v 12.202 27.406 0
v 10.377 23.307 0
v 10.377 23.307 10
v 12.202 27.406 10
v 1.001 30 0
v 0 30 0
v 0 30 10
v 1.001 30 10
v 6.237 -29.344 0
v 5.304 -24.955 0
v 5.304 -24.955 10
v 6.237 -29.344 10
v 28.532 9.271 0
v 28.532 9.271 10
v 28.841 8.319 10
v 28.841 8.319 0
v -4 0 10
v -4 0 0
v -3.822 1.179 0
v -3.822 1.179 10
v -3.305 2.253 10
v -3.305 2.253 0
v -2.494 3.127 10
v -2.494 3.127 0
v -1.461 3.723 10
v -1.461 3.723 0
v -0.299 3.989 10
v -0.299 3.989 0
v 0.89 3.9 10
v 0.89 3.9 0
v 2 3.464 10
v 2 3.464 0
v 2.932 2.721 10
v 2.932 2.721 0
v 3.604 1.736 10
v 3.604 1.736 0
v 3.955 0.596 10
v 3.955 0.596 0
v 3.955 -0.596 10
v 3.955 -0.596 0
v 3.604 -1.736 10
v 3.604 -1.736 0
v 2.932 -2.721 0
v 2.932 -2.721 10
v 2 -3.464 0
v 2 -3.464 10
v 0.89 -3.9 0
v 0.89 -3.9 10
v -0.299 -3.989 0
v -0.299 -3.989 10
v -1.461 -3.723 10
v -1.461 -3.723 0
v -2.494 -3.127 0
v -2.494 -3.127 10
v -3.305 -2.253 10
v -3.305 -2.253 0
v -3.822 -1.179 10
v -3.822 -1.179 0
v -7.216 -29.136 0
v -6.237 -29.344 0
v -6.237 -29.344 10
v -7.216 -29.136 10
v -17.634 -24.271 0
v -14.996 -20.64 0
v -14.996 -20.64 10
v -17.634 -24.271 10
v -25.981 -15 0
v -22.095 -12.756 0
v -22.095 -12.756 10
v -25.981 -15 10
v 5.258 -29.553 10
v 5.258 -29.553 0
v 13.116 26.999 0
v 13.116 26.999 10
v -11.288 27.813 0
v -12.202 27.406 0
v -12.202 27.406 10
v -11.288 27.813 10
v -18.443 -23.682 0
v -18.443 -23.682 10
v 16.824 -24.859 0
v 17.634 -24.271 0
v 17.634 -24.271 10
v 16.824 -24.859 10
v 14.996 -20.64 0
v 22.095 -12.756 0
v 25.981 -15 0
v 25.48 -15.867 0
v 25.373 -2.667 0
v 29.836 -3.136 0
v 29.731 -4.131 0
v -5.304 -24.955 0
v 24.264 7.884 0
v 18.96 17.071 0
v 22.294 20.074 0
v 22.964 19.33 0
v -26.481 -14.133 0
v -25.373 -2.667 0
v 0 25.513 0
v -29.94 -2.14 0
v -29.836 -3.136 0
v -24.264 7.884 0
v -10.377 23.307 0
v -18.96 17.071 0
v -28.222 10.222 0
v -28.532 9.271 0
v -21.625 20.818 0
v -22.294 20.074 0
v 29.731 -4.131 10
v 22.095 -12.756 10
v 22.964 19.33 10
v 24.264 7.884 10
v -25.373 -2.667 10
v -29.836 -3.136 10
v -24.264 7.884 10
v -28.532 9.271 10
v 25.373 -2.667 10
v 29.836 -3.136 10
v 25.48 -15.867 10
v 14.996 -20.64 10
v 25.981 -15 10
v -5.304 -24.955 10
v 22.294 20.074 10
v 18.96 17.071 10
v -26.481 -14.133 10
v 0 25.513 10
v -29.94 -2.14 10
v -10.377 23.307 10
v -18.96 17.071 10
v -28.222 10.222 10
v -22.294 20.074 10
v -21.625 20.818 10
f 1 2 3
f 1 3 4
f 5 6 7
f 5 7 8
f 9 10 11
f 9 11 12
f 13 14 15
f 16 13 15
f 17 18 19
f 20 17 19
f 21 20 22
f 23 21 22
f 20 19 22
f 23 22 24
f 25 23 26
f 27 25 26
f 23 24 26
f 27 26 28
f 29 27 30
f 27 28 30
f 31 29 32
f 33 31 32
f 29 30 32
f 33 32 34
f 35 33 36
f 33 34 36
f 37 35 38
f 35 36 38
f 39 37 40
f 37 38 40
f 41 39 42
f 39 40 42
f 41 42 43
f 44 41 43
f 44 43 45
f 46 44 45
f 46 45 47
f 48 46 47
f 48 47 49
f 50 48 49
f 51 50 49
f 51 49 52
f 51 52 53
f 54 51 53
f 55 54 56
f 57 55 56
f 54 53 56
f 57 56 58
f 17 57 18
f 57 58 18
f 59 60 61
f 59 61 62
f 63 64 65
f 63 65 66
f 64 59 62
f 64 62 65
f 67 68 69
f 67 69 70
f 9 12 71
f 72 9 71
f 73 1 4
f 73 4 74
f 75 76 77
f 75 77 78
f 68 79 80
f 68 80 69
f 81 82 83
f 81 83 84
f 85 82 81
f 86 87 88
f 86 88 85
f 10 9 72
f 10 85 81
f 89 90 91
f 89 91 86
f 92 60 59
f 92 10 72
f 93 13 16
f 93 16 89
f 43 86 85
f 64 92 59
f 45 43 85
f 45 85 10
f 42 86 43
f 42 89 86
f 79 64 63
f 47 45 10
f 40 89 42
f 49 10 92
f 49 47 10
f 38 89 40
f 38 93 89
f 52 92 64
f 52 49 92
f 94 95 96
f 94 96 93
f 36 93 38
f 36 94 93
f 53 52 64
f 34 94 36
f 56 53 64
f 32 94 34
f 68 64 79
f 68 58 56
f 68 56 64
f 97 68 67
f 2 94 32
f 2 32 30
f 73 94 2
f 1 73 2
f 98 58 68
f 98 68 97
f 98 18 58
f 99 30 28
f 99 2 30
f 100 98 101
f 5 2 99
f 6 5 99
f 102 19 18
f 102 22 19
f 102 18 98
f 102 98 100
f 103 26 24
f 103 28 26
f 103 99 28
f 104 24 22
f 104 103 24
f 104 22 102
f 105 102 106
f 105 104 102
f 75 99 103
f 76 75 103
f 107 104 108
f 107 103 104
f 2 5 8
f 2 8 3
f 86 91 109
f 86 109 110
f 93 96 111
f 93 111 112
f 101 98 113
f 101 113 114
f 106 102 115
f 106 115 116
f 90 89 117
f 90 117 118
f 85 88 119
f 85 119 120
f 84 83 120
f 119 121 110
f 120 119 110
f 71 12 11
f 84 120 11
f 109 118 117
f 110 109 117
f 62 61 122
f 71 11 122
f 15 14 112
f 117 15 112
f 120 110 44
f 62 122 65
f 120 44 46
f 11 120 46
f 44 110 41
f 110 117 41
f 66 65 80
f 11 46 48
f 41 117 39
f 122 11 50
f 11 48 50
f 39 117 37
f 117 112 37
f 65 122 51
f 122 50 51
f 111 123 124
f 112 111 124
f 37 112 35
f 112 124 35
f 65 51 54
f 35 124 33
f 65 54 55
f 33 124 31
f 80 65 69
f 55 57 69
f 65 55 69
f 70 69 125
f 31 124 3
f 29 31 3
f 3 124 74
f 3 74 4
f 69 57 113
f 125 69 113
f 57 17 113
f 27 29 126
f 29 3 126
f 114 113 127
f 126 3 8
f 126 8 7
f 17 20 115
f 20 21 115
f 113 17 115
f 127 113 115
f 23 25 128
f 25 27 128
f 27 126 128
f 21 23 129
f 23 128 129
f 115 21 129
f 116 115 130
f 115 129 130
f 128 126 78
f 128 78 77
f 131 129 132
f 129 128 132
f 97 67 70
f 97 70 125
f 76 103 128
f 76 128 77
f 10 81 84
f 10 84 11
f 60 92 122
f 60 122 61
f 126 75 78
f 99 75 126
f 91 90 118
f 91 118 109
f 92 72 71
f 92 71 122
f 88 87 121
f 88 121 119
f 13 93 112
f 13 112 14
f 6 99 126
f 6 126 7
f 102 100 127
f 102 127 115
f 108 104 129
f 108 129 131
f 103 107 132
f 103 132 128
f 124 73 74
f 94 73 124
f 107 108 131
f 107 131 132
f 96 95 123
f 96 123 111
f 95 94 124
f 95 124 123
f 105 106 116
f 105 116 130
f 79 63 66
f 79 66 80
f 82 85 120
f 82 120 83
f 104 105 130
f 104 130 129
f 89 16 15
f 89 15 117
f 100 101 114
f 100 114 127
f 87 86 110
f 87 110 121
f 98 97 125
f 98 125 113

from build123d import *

# Parameters (mm, degrees)
BOSS_EXTRUDE2_DEPTH = 10
SKETCH2_R           = 4
CUT_EXTRUDE1_DEPTH  = 10


with BuildPart() as part:
    # Sketch1 → Boss-Extrude2 (new body)
    with BuildSketch(Plane.XY):
        Polygon((0, 25.51264103), (0, 30), (1.000891574, 30), (10.376925968, 23.306957325), (12.202099292, 27.406363729), (13.116459243, 26.99926445), (18.959587166, 17.071288962), (22.294344764, 20.073918191), (22.96407195, 19.330110797), (24.263963499, 7.88383965), (28.531695489, 9.270509831), (28.840987995, 8.318605378), (25.372880113, -2.666797161), (29.835656861, -3.135853898), (29.731035203, -4.131262483), (22.094595249, -12.756320515), (25.980762114, -15), (25.480316326, -15.86679753), (14.995954144, -20.640160164), (17.633557569, -24.270509831), (16.823819276, -24.858819138), (5.304376334, -24.955128612), (6.237350725, -29.344428022), (5.258331033, -29.552525082), (-5.304376334, -24.955128612), (-6.237350725, -29.344428022), (-7.216370416, -29.136330963), (-14.995954144, -20.640160164), (-17.633557569, -24.270509831), (-18.443295862, -23.682200525), (-22.094595249, -12.756320515), (-25.980762114, -15), (-26.481207901, -14.13320247), (-25.372880113, -2.666797161), (-29.835656861, -3.135853898), (-29.940278519, -2.140445313), (-24.263963499, 7.88383965), (-28.531695489, 9.270509831), (-28.222402983, 10.222414285), (-18.959587165, 17.071288962), (-22.294344764, 20.073918191), (-21.624617578, 20.817725585), (-10.376925968, 23.306957325), (-12.202099292, 27.406363729), (-11.287739341, 27.813463008), align=None)
    extrude(amount=BOSS_EXTRUDE2_DEPTH)

    # Sketch2 → Cut-Extrude1 (cut)
    with BuildSketch(Plane(origin=(0, 0, 0), x_dir=(-1, 0, 0), z_dir=(0, 0, -1))):
        Circle(SKETCH2_R)
    extrude(amount=-CUT_EXTRUDE1_DEPTH, mode=Mode.SUBTRACT)


solid = part.part
